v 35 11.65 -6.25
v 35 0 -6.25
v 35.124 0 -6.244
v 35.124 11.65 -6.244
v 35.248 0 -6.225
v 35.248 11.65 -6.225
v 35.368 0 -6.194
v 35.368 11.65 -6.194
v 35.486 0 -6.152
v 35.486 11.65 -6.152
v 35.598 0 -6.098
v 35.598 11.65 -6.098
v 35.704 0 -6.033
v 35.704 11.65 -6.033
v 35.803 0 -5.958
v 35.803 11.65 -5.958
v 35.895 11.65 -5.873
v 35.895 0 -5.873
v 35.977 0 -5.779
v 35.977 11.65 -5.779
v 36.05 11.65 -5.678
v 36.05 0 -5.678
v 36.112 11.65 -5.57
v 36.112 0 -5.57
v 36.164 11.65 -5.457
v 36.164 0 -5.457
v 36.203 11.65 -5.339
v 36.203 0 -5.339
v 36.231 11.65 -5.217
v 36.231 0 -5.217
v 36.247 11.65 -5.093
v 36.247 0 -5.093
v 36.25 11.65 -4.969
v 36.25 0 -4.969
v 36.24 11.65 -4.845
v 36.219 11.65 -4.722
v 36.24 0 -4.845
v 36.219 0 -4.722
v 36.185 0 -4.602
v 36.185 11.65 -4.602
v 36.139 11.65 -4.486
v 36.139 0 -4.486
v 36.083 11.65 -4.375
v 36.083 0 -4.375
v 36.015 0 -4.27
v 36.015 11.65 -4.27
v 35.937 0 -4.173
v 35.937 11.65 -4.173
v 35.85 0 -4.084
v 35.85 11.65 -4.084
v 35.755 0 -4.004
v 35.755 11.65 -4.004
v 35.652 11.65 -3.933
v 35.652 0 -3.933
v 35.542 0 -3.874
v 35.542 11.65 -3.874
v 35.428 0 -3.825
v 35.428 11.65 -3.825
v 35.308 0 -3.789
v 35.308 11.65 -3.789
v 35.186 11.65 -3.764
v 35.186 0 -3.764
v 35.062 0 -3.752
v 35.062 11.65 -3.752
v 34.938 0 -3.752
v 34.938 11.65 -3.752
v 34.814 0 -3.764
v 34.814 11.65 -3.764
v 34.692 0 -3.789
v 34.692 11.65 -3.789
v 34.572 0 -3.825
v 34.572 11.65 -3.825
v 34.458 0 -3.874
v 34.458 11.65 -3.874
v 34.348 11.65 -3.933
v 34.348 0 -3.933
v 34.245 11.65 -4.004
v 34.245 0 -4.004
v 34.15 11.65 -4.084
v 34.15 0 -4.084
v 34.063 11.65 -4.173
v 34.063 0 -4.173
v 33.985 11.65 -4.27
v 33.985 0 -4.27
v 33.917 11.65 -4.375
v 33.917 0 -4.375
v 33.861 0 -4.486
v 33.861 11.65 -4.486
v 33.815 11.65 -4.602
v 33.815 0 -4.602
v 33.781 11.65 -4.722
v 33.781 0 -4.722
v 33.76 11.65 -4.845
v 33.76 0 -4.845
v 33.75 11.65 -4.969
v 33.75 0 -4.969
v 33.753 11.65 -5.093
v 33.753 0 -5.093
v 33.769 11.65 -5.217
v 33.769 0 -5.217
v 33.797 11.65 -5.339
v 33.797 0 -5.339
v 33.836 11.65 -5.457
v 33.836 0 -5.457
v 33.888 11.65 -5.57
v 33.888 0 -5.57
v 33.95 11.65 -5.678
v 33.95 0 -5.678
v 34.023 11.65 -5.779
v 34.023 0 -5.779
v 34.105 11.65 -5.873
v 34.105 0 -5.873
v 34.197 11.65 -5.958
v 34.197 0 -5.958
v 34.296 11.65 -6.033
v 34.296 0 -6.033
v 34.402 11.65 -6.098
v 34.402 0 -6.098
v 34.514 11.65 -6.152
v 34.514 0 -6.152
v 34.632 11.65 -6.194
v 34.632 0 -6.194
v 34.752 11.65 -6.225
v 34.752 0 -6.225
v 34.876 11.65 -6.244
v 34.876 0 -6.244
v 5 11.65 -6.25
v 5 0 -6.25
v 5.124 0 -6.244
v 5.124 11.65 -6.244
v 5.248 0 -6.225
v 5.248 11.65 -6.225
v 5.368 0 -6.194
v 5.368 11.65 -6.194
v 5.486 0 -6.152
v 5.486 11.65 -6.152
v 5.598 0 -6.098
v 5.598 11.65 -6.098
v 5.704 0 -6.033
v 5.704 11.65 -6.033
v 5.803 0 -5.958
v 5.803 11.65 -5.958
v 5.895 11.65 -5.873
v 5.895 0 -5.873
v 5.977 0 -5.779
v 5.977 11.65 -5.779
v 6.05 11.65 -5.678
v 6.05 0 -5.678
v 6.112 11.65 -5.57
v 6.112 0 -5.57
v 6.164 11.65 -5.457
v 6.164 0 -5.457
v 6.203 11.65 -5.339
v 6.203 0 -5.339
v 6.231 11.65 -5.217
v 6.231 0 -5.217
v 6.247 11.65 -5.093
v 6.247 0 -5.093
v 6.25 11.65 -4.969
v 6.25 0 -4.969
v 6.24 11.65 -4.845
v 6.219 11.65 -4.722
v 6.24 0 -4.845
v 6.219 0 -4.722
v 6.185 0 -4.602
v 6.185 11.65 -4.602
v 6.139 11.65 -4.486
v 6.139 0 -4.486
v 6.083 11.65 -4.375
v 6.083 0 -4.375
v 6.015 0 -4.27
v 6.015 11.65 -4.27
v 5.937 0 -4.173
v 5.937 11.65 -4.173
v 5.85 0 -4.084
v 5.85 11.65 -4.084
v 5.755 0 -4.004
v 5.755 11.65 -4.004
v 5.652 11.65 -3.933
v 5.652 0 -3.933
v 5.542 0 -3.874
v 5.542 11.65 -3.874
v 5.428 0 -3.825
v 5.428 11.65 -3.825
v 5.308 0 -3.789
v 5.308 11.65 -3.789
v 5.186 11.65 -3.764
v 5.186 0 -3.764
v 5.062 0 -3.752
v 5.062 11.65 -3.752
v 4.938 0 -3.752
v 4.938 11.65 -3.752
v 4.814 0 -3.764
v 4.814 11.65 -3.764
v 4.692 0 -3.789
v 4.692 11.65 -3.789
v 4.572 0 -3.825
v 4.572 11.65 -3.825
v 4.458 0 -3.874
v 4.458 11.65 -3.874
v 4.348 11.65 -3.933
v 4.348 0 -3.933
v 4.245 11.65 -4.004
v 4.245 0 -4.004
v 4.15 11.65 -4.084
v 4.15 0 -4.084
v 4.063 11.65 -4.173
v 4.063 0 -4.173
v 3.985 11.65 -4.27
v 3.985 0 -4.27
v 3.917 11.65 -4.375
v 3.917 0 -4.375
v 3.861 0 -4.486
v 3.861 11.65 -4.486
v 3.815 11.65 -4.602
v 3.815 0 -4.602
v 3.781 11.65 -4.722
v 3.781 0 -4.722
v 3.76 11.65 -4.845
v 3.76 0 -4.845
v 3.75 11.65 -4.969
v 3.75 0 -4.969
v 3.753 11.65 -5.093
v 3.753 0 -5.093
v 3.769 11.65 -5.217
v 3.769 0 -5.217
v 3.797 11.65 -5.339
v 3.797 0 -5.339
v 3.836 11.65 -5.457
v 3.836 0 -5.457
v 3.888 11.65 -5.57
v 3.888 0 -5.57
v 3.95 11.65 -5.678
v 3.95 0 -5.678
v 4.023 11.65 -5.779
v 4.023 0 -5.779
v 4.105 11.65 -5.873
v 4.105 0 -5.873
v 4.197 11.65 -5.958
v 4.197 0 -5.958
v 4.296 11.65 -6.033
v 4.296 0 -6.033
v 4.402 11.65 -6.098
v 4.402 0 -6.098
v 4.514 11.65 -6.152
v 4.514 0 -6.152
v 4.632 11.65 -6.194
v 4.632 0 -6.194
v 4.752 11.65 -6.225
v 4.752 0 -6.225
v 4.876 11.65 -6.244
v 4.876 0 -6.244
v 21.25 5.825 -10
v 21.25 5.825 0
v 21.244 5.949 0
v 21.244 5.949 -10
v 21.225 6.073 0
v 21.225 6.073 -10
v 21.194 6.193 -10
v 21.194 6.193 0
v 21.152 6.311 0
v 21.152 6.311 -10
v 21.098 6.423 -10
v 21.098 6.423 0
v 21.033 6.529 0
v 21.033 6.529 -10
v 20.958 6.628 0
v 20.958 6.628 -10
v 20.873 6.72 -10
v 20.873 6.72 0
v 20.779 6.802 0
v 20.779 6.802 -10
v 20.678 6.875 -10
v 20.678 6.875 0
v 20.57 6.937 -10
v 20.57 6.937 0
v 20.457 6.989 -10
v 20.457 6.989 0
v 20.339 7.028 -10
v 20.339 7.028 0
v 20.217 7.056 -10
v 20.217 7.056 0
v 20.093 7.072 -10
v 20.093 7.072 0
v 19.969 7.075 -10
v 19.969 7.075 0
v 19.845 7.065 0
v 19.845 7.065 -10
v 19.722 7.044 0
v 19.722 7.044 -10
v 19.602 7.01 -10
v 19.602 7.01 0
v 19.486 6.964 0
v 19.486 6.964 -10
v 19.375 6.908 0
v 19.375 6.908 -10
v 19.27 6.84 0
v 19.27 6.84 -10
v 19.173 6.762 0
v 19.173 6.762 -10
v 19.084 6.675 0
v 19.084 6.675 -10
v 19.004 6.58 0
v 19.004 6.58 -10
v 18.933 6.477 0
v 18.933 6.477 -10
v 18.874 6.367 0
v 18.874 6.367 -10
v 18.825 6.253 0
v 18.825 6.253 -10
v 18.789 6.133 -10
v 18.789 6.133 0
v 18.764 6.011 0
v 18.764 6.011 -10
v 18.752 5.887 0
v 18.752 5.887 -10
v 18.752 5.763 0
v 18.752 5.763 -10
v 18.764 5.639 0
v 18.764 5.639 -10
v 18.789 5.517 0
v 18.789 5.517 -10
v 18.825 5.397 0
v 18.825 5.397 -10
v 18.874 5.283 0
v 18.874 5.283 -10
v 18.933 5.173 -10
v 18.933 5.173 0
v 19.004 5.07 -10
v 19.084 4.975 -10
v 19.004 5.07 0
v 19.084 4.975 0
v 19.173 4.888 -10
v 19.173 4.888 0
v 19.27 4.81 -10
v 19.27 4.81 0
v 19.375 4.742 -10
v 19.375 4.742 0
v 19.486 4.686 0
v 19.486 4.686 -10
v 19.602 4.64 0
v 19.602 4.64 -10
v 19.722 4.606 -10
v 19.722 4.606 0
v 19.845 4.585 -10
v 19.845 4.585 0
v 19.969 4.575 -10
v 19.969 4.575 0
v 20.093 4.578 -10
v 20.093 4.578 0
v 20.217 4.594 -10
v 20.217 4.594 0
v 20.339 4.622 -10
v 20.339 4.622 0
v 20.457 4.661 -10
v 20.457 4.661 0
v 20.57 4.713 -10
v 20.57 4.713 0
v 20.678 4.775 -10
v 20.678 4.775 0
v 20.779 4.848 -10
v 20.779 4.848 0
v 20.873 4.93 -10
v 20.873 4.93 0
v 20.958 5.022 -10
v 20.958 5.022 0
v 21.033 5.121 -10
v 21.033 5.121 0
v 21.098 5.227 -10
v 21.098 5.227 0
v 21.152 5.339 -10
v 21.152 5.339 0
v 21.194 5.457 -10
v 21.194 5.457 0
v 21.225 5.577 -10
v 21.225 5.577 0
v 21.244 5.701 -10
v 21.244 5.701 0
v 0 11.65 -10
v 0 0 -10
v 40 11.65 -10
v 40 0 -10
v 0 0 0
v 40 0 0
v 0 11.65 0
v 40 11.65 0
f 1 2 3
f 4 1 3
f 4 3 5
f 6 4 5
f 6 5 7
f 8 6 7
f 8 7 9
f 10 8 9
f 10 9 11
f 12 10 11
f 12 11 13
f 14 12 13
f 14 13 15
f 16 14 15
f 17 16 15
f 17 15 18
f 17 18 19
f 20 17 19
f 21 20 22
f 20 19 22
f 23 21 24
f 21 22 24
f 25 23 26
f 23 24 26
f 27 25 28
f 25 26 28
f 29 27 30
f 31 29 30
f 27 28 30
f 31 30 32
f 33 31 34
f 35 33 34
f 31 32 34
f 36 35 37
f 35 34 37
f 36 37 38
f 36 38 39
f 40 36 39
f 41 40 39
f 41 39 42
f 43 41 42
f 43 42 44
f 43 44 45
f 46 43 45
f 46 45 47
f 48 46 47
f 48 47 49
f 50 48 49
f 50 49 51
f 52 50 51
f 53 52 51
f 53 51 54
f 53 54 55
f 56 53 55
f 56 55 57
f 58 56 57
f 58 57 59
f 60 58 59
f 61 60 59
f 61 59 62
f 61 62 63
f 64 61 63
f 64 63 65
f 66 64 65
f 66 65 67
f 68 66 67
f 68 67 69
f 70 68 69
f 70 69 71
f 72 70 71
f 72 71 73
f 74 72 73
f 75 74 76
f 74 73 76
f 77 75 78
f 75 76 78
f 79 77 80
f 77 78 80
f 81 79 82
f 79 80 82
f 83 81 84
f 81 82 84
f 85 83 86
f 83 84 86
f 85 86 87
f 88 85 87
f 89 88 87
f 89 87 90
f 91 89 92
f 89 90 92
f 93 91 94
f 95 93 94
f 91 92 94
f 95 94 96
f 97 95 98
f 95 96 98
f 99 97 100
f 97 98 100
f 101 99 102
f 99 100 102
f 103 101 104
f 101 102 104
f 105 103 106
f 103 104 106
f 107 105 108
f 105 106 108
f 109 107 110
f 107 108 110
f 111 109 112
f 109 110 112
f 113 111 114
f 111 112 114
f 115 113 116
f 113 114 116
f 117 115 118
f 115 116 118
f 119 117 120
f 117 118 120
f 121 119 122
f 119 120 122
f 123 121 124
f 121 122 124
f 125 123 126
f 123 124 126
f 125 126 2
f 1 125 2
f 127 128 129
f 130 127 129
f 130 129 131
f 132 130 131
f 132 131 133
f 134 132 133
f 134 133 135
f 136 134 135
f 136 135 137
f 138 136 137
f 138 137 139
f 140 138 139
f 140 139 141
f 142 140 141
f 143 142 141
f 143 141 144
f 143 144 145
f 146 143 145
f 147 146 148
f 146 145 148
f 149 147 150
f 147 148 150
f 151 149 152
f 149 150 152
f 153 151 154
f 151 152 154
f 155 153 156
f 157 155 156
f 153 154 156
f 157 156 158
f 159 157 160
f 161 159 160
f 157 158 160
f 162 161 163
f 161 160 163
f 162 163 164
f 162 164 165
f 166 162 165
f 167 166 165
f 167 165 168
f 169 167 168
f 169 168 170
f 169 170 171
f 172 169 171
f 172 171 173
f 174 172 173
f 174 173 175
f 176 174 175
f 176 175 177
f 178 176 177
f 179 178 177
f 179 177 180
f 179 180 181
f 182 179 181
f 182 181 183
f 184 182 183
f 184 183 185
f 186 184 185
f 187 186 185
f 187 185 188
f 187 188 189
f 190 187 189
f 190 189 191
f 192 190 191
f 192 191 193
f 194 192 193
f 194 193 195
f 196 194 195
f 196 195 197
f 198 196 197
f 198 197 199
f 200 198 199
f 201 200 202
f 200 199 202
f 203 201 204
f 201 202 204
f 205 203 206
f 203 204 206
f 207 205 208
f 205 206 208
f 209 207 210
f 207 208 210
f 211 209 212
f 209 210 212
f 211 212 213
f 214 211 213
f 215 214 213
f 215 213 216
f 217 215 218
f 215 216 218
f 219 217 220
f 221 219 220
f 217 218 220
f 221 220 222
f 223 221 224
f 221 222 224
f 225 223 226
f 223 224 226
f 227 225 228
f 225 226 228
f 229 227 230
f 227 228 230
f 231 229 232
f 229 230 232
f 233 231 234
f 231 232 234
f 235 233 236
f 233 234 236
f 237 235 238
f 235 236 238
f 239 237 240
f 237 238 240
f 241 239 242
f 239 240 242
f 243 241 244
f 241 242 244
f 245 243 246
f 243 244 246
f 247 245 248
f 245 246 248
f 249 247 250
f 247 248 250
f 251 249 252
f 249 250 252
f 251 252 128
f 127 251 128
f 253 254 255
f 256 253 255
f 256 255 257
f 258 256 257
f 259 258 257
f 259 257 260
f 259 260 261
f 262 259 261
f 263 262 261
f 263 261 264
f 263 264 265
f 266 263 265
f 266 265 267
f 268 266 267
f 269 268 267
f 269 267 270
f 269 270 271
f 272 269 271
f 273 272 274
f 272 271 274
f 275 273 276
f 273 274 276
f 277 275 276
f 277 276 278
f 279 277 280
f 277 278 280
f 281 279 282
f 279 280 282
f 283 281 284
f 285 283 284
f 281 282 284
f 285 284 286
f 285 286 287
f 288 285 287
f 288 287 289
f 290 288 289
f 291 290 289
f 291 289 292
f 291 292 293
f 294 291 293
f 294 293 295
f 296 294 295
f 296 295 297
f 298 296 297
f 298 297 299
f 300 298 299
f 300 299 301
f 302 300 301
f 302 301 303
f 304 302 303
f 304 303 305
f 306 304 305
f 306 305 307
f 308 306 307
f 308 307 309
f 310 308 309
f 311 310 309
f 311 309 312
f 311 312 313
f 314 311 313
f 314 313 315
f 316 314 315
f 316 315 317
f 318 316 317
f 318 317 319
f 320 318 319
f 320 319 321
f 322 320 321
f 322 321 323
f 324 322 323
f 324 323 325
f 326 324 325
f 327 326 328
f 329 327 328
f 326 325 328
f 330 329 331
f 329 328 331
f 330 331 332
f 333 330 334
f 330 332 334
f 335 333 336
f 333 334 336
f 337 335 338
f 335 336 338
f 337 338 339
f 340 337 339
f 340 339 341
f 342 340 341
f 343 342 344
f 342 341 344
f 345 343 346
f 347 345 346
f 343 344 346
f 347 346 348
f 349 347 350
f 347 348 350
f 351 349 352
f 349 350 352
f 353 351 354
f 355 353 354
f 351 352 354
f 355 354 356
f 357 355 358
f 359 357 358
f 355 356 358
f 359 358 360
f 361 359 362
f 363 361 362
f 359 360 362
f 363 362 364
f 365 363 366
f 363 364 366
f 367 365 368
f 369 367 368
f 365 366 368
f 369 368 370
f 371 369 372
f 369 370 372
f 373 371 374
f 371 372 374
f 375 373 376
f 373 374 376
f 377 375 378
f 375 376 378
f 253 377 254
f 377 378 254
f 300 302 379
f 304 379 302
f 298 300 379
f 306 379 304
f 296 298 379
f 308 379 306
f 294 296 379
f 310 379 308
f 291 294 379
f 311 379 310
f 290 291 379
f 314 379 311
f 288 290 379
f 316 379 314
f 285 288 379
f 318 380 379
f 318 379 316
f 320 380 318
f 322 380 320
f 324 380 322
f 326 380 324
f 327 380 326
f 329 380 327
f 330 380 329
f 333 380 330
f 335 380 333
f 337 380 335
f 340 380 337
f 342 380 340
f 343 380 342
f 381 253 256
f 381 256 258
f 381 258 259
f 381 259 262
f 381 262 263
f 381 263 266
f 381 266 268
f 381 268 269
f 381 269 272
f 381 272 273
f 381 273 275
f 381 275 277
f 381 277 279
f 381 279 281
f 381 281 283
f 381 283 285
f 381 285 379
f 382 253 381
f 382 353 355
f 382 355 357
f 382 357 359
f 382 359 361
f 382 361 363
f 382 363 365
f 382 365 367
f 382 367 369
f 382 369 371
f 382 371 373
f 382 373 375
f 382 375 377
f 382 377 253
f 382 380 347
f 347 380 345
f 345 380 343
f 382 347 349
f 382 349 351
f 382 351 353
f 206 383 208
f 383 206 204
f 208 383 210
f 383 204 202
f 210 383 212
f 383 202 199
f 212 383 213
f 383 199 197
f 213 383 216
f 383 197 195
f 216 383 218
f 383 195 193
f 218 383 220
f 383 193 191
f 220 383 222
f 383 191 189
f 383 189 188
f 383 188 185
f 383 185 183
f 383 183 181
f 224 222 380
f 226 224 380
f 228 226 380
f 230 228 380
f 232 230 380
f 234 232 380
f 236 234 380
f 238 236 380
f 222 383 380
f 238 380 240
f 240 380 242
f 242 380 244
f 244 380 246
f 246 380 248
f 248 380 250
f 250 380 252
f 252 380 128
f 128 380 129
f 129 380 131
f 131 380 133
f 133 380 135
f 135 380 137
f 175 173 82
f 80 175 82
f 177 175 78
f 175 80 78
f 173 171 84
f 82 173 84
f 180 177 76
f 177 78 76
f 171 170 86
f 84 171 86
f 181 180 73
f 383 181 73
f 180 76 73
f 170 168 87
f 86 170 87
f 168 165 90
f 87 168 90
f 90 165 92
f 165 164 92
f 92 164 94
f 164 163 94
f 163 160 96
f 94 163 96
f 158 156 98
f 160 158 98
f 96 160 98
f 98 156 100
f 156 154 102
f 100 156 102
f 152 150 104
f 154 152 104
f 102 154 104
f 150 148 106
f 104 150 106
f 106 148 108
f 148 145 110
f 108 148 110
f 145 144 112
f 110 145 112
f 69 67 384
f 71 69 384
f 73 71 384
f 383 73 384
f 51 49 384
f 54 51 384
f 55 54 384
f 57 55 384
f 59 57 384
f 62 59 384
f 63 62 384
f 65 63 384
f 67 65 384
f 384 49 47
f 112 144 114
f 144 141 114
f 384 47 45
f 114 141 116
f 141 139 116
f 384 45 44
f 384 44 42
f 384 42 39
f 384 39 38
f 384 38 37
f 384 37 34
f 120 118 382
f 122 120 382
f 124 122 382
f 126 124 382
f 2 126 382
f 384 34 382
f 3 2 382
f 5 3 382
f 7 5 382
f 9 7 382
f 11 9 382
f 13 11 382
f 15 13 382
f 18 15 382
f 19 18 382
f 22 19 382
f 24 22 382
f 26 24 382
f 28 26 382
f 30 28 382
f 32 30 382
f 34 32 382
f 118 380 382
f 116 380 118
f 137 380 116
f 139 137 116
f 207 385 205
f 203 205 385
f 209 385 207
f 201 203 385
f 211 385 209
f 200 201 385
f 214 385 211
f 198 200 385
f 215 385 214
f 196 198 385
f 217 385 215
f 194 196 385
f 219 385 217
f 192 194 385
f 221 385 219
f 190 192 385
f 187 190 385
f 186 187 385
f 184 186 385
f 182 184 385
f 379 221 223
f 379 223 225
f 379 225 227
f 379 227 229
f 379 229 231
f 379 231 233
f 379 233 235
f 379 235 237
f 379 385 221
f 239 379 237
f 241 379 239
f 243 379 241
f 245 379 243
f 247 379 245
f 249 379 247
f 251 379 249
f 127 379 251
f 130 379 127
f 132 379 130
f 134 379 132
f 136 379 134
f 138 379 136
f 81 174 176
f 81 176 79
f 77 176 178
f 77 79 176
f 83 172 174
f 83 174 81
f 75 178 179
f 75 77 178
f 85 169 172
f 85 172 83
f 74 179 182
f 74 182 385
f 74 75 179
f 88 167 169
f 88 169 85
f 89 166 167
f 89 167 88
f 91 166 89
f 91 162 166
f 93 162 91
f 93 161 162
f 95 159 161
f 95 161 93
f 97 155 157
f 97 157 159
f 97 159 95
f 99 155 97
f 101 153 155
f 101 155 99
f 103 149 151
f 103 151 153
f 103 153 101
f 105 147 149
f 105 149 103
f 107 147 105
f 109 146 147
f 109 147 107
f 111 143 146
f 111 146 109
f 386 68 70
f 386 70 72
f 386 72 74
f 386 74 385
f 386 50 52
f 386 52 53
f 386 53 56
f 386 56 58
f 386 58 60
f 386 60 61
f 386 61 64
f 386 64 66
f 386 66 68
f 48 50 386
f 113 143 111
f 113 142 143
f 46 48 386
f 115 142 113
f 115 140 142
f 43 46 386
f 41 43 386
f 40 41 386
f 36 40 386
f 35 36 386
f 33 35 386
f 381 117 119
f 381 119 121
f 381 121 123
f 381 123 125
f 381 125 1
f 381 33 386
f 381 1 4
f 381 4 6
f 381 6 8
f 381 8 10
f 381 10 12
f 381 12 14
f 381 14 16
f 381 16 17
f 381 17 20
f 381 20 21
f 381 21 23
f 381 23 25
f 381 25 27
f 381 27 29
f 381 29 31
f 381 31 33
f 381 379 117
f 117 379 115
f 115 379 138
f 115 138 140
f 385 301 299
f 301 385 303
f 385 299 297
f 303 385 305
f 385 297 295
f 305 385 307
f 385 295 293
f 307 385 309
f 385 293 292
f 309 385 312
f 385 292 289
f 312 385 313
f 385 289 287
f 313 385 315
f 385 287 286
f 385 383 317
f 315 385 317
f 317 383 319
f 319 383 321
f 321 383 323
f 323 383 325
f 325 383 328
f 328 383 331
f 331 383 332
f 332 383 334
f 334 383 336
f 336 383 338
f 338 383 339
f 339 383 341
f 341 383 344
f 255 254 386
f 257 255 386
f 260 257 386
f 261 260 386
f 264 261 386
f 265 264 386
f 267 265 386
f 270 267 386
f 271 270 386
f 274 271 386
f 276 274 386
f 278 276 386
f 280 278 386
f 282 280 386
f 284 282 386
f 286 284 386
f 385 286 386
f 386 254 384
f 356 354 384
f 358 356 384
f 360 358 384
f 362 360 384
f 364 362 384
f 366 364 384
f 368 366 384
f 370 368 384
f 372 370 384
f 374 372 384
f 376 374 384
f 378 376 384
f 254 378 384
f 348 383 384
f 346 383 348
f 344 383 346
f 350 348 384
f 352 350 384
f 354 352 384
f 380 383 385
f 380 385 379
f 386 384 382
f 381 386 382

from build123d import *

# Parameters (mm, degrees)
SKETCH1_W             = 40
SKETCH1_H             = 10
BOSS_EXTRUDE1_DEPTH   = 11.65
M3X0_5_TAPPED_HOLE3_D = 2.5
M3X0_5_TAPPED_HOLE4_D = 2.5


with BuildPart() as part:
    # Sketch1 → Boss-Extrude1 (new body)
    with BuildSketch(Plane(origin=(0, 0, 0), x_dir=(1, 0, 0), z_dir=(0, 1, 0))):
        with Locations((20, 5)):
            Rectangle(SKETCH1_W, SKETCH1_H)
    extrude(amount=BOSS_EXTRUDE1_DEPTH)

    # M3x0.5 Tapped Hole3 (through all)
    with Locations(Plane(origin=(5, 11.65, -5), x_dir=(0, 0, 1), z_dir=(0, 1, 0))):
        with Locations((0, 0), (0, 30)):
            Hole(M3X0_5_TAPPED_HOLE3_D / 2)

    # M3x0.5 Tapped Hole4 (through all)
    with Locations(Plane(origin=(20, 5.825, -10), x_dir=(-1, 0, 0), z_dir=(0, 0, -1))):
        with Locations((0, 0)):
            Hole(M3X0_5_TAPPED_HOLE4_D / 2)


solid = part.part
